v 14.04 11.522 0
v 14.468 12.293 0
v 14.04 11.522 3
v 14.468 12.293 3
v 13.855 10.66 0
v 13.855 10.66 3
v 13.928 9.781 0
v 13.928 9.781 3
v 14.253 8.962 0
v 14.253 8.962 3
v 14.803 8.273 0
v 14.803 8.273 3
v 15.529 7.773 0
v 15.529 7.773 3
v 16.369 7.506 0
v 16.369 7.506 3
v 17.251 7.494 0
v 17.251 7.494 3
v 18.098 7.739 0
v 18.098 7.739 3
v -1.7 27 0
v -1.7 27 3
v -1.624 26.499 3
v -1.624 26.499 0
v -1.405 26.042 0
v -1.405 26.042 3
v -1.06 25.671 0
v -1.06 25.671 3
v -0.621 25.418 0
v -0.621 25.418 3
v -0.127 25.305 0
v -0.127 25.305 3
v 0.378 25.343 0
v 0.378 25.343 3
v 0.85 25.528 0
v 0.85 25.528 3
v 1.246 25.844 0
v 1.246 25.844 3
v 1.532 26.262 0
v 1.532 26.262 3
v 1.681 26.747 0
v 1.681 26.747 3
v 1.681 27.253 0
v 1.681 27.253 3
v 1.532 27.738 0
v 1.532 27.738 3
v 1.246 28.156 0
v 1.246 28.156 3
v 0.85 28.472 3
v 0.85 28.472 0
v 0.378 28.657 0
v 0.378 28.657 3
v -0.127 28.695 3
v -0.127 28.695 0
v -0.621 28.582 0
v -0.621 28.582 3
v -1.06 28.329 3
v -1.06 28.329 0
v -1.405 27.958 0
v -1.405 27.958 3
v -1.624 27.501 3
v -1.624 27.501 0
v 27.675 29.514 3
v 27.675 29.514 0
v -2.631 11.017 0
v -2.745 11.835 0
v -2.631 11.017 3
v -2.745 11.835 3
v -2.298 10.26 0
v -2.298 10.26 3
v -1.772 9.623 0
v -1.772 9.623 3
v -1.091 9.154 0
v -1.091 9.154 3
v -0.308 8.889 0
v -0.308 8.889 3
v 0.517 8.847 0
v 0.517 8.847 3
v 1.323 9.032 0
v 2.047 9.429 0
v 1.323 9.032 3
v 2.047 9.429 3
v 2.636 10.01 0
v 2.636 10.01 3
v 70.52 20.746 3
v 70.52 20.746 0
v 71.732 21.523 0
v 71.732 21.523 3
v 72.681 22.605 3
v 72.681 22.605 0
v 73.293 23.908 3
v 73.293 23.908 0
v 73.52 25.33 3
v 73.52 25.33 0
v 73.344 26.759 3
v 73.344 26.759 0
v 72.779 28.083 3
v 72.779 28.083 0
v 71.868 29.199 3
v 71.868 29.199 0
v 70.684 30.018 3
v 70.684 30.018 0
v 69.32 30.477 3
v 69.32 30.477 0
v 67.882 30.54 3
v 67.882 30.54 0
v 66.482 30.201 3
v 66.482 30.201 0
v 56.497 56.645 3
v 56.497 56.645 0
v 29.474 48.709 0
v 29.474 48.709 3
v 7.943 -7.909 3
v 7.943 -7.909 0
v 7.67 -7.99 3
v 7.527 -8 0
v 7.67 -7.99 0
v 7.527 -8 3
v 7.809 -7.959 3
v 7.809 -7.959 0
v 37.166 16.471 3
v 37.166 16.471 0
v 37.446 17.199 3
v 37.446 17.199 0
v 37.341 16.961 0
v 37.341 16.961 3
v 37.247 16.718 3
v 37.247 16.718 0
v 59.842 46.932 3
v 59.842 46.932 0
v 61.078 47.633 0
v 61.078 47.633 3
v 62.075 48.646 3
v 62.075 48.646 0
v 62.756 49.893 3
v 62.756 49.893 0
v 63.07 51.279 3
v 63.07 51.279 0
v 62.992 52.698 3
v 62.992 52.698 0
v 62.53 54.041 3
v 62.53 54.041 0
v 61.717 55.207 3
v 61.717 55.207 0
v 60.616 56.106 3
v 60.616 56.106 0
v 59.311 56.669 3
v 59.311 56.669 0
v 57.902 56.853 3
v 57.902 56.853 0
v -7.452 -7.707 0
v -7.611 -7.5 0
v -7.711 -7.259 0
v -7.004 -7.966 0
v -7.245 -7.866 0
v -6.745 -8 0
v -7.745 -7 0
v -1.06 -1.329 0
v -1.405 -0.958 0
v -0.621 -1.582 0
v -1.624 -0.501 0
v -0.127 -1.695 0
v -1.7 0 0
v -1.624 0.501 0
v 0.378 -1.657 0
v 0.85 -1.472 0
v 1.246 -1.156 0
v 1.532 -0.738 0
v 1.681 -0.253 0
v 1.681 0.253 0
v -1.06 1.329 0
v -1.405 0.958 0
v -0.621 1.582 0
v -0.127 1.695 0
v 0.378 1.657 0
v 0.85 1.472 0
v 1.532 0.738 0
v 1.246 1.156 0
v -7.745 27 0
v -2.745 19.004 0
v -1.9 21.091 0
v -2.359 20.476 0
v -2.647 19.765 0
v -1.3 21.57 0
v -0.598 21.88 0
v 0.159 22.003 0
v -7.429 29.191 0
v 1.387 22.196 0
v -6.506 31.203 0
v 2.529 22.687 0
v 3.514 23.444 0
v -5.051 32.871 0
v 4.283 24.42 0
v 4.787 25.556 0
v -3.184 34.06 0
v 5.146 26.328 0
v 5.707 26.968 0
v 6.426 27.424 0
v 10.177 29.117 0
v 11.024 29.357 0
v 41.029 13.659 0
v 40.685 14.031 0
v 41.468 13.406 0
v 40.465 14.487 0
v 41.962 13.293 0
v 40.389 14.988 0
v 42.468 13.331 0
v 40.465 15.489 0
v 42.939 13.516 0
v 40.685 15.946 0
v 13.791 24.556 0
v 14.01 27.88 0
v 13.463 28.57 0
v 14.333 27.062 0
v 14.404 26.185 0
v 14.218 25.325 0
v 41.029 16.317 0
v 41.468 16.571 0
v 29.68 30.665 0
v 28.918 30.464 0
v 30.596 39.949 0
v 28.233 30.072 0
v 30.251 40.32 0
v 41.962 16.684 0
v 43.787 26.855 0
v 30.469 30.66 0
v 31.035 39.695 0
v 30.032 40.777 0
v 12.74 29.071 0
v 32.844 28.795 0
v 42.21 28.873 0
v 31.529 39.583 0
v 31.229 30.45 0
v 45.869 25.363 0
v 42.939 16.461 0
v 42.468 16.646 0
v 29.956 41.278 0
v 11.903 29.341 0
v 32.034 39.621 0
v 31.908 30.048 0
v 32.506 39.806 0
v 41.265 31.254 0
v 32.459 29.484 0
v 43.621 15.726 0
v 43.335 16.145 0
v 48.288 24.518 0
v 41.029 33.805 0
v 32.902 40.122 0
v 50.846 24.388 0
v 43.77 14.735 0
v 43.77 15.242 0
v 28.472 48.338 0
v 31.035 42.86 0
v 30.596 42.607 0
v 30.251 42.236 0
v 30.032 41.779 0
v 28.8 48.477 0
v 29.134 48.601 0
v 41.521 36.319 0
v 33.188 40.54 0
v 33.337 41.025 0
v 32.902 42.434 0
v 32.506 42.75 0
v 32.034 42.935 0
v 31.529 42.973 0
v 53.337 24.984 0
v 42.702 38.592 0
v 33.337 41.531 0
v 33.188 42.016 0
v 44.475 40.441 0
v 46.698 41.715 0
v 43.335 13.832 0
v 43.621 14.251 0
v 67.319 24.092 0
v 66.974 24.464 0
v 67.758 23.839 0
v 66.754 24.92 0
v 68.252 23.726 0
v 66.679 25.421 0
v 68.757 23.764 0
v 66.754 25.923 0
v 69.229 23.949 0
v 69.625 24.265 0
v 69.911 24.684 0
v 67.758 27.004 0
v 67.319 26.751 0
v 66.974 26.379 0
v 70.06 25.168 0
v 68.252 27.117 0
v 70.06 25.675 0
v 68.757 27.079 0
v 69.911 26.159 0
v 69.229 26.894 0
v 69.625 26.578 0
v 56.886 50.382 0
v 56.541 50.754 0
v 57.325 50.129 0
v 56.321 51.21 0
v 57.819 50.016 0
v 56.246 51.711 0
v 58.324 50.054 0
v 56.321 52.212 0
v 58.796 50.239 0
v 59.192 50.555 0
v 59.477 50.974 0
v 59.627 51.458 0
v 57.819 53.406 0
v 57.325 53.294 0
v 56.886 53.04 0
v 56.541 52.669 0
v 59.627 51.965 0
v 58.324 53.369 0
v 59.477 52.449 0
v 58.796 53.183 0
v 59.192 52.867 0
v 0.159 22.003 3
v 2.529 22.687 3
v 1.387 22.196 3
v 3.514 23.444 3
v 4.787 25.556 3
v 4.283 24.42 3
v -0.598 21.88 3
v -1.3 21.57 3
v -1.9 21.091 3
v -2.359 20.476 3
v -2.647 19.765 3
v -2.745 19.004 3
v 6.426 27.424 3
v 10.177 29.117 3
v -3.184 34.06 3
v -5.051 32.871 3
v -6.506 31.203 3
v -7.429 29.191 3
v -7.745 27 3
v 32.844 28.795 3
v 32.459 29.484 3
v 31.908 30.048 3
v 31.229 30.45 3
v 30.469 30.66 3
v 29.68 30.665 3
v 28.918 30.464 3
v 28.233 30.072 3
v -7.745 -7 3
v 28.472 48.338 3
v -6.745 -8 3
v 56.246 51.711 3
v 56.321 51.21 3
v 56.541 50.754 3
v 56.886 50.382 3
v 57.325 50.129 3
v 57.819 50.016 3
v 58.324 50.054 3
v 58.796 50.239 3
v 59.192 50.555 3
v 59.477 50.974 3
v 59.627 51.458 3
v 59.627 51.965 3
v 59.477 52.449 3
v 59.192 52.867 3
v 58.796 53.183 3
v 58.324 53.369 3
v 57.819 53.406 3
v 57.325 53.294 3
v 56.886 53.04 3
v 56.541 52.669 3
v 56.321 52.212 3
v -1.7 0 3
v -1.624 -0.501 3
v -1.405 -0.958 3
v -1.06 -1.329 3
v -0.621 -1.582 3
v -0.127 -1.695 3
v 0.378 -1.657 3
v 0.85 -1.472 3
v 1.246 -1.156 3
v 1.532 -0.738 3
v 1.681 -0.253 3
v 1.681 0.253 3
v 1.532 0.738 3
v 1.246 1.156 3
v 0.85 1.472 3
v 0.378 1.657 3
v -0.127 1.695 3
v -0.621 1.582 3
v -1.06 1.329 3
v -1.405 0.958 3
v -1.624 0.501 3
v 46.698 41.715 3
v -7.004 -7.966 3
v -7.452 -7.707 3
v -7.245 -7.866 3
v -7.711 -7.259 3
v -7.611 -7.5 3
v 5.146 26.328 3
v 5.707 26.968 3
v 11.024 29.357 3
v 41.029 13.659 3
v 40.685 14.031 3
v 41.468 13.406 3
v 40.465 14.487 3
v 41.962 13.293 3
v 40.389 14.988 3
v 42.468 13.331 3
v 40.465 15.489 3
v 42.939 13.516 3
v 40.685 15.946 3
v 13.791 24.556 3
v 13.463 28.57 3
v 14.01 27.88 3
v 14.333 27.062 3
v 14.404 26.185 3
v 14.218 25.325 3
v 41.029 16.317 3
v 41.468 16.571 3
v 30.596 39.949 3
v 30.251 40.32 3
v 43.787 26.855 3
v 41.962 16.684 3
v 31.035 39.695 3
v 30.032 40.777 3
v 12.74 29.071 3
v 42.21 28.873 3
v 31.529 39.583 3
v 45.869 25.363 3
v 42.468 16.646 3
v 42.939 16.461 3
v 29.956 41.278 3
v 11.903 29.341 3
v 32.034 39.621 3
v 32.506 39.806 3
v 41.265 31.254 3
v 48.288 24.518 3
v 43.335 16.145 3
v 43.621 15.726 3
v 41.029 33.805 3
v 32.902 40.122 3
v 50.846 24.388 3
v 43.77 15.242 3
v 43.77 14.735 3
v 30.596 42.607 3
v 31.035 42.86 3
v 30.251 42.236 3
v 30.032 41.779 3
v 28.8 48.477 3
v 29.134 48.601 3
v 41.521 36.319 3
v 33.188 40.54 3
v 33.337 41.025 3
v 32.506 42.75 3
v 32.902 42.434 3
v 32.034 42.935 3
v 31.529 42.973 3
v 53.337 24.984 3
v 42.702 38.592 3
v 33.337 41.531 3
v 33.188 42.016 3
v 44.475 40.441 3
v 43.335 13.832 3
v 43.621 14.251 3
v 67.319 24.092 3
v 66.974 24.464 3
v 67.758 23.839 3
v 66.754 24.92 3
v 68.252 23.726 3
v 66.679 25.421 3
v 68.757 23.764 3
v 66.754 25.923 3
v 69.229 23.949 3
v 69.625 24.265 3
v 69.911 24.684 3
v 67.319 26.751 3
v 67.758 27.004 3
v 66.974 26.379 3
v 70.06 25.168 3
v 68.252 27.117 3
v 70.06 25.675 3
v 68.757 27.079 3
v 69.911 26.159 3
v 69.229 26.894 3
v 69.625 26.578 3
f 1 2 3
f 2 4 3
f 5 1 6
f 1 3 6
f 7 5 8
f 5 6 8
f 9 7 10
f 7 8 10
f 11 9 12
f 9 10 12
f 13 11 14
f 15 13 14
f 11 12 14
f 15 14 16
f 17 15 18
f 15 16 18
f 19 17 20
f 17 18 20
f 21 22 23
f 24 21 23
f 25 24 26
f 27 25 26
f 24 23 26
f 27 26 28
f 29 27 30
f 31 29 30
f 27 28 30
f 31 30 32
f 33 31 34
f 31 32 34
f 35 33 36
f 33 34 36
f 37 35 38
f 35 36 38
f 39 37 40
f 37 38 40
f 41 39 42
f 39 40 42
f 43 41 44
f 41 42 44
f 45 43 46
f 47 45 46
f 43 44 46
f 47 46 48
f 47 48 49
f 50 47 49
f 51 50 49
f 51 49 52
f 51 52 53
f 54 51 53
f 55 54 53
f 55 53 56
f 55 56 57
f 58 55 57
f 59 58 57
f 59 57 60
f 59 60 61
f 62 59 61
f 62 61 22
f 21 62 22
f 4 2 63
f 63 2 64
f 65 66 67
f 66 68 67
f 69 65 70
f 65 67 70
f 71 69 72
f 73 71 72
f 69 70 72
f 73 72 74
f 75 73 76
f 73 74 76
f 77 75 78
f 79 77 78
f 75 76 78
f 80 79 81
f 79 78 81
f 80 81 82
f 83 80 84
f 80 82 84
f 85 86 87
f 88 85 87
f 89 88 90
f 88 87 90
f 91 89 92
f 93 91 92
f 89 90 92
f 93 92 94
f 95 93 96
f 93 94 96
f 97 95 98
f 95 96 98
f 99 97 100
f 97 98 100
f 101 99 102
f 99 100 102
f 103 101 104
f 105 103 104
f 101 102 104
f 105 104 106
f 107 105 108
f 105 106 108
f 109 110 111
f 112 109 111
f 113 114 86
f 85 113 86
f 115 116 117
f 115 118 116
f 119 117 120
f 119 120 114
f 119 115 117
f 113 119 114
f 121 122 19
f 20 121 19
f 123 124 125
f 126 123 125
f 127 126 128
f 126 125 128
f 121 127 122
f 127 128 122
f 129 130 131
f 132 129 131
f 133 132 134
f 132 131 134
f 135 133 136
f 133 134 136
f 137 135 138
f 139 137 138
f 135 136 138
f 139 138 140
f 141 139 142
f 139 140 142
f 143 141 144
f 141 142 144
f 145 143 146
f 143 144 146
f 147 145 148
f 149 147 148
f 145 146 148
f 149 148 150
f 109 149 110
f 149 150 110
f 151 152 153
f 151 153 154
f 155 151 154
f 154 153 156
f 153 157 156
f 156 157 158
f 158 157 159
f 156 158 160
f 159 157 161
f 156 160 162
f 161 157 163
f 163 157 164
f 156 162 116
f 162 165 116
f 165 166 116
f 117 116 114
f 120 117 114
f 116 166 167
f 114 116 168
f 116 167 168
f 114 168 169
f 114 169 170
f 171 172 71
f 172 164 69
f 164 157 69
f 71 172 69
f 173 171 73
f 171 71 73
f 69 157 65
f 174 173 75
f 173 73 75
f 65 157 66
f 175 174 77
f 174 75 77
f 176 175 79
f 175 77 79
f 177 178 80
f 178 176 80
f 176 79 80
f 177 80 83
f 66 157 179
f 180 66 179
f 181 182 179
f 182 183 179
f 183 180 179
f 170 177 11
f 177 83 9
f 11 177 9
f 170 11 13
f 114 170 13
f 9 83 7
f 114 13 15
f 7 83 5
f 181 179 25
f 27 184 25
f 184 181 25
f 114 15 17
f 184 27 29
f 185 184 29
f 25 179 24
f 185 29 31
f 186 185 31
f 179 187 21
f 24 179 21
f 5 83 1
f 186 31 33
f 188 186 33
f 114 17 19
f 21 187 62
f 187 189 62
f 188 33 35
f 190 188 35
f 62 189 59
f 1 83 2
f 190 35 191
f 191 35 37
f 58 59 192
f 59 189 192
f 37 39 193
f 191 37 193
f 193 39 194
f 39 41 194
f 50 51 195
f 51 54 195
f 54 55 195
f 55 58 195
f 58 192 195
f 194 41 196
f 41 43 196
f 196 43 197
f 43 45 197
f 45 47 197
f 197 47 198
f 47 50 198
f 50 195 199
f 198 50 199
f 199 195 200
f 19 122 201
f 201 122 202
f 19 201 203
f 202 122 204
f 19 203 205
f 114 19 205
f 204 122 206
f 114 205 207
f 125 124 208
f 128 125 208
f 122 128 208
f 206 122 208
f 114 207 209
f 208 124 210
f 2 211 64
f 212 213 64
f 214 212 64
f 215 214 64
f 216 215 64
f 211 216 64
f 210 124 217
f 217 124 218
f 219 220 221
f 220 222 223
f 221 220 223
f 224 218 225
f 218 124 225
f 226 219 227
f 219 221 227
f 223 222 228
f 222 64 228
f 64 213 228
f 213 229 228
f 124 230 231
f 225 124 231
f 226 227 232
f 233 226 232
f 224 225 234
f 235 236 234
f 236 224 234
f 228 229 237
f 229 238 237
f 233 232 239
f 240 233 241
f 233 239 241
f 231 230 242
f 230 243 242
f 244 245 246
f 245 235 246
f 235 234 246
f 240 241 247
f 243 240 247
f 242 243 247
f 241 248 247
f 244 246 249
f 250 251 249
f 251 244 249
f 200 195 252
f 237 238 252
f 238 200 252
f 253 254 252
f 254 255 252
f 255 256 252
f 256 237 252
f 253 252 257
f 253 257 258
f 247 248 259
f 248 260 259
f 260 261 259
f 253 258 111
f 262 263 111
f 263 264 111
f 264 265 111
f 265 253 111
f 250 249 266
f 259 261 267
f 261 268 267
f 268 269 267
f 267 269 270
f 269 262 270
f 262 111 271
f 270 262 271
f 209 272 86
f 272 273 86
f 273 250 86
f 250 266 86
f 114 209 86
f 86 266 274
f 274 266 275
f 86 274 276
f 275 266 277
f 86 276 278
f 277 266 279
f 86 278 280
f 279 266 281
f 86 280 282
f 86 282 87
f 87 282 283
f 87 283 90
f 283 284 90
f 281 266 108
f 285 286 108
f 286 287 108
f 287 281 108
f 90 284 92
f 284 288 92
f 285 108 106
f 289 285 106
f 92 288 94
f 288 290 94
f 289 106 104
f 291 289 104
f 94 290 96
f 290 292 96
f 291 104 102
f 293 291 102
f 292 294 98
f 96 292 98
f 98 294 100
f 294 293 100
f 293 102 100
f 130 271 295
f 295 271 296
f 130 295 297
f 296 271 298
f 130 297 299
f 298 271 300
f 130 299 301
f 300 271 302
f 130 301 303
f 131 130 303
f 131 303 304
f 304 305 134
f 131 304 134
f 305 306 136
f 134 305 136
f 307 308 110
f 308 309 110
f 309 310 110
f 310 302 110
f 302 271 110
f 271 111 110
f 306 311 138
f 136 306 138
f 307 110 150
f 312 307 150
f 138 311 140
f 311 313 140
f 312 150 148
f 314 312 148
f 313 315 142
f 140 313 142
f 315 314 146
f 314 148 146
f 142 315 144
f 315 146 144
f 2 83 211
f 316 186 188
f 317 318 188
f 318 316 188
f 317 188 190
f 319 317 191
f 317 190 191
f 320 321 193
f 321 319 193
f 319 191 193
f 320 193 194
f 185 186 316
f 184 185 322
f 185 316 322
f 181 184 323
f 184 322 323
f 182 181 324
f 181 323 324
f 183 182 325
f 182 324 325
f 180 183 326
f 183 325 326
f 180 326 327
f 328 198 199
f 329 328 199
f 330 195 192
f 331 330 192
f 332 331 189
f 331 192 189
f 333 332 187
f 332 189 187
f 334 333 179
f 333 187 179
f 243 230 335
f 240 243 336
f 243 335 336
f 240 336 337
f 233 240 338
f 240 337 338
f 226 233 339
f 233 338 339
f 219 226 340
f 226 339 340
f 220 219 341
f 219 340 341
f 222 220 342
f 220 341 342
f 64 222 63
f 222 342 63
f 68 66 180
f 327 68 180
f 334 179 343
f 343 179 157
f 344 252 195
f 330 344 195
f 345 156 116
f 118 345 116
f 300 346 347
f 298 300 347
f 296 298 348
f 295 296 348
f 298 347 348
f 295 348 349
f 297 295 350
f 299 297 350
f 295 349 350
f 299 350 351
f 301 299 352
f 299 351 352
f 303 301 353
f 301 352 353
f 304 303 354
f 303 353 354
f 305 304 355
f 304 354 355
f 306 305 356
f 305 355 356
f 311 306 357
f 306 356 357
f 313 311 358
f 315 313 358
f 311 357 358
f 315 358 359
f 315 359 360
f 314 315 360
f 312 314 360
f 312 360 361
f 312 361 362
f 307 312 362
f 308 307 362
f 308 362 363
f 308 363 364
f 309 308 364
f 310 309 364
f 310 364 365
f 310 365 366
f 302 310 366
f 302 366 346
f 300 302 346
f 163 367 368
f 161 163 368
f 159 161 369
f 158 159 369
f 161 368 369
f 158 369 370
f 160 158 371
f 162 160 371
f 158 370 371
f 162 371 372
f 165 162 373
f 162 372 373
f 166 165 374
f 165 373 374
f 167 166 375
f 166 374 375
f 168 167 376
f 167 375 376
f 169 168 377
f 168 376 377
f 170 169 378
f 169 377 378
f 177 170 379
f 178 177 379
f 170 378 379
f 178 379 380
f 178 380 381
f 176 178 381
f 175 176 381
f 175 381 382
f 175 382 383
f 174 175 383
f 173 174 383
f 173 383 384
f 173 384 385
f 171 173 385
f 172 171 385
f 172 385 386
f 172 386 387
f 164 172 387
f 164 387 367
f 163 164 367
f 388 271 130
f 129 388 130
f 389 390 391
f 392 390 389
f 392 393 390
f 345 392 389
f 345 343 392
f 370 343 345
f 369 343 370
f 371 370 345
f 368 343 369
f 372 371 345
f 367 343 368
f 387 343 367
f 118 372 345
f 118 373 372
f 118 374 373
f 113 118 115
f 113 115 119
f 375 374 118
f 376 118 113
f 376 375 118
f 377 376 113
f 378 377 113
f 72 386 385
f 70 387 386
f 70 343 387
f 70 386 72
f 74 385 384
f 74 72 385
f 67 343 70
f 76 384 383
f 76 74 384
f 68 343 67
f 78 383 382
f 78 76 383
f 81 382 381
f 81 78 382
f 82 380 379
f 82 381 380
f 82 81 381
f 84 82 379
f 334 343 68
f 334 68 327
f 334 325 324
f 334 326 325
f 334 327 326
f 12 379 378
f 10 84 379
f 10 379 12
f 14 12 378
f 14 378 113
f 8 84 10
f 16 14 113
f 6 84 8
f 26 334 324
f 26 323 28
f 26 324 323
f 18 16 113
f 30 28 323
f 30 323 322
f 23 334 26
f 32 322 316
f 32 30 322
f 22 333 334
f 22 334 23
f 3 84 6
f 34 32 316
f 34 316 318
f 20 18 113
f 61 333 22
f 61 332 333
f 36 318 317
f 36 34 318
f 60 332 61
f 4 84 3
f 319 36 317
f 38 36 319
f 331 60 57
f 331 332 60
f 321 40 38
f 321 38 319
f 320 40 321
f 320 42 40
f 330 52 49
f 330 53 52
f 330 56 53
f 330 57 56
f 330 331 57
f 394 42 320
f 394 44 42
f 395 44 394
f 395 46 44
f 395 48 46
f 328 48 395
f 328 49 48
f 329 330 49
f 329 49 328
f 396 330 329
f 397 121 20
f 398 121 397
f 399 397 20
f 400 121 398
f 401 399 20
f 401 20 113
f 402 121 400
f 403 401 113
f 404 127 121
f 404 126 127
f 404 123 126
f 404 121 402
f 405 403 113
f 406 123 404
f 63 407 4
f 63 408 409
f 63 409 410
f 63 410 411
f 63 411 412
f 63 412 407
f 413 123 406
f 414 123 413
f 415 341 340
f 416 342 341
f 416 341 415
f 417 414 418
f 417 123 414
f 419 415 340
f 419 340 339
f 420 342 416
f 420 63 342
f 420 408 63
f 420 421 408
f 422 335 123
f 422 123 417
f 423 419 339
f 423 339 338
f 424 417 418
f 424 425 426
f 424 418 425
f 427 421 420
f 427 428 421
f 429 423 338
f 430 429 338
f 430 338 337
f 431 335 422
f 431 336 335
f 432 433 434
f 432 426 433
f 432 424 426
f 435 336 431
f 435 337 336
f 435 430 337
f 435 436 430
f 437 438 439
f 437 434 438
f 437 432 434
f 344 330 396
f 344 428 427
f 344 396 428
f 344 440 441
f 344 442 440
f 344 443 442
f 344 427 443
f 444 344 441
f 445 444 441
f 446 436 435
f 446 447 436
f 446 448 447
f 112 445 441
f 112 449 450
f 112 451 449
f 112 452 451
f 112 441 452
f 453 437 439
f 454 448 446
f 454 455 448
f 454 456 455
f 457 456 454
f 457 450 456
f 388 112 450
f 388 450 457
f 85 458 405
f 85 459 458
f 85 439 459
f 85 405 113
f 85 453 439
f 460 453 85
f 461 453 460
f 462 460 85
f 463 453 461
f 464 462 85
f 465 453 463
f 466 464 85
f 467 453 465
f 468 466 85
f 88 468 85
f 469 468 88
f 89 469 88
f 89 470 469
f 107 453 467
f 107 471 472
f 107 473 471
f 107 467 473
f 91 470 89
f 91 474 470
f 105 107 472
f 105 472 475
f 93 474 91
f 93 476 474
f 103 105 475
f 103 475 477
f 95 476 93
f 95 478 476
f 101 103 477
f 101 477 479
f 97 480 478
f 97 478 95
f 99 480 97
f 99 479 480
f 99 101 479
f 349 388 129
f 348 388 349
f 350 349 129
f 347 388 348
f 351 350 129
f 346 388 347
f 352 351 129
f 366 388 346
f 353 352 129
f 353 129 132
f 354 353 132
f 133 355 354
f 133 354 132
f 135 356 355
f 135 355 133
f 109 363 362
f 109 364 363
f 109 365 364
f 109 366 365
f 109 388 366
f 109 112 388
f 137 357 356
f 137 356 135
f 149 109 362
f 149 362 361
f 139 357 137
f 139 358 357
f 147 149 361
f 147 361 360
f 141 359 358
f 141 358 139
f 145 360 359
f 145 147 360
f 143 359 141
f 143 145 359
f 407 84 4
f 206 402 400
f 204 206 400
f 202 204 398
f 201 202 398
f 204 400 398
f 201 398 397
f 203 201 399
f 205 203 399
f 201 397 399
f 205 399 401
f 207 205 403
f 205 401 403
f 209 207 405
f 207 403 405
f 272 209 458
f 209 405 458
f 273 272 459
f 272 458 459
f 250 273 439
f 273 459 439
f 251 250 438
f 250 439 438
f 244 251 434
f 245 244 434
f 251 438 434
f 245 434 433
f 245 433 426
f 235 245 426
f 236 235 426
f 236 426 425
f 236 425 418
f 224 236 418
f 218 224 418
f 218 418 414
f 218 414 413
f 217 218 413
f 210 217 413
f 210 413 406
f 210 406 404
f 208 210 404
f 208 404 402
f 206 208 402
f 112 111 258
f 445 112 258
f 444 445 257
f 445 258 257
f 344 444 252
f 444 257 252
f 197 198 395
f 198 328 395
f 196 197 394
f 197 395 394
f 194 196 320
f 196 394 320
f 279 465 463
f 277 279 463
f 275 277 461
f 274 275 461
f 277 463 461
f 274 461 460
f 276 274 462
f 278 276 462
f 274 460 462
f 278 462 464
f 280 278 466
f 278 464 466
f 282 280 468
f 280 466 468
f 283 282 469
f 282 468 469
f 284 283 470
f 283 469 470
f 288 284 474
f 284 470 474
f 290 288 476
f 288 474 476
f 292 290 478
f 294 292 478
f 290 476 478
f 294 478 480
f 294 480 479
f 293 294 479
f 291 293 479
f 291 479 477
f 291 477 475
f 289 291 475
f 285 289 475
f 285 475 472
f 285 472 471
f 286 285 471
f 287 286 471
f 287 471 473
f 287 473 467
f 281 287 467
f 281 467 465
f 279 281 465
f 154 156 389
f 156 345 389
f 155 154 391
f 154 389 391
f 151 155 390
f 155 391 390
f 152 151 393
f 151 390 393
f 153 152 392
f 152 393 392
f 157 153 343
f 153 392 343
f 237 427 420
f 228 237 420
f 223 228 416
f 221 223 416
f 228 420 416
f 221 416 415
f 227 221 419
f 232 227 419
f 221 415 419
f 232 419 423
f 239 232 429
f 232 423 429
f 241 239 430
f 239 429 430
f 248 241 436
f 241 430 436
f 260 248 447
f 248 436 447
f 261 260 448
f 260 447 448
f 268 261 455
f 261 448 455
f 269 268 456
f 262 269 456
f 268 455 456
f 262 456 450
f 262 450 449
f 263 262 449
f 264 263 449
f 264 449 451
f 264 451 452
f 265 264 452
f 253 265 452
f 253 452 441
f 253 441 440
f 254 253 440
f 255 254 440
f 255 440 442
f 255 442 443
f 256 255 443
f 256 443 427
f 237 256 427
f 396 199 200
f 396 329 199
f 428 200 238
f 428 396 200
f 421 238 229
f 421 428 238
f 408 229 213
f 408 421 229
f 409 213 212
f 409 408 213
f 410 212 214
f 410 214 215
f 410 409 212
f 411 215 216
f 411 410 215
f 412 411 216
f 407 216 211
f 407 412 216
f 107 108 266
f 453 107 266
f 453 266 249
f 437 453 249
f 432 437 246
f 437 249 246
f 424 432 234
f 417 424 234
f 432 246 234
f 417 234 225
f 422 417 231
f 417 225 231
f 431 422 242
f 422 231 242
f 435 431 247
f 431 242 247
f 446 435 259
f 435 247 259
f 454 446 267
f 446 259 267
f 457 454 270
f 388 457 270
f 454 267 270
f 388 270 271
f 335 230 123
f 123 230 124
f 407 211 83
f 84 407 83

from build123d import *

# Parameters (mm, degrees)
BOSS_EXTRUDE1_DEPTH  = 3
M3_CLEARANCE_HOLE1_D = 3.4
FILLET1_R            = 1
CUT_EXTRUDE1_DEPTH   = 93.987352344
FILLET2_R            = 3


with BuildPart() as part:
    # Sketch1 → Boss-Extrude1 (new body)
    with BuildSketch(Plane.XY):
        with BuildLine():
            Line((-7.745, -8), (7.745, -8))
            Line((7.745, -8), (70.519857407, 20.746231418))
            ThreePointArc((70.519857407, 20.746231418), (73.107899278, 27.441010115), (66.482157687, 30.201004841))
            Line((66.482157687, 30.201004841), (53.337310845, 24.984396605))
            ThreePointArc((53.337310845, 24.984396605), (41.652152386, 30.029896758), (46.697652539, 41.715055217))
            Line((46.697652539, 41.715055217), (59.842499382, 46.931663453))
            ThreePointArc((59.842499382, 46.931663453), (62.807533315, 53.385795263), (56.49682568, 56.644968901))
            Line((56.49682568, 56.644968901), (29.473725399, 48.709154624))
            ThreePointArc((29.473725399, 48.709154624), (28.966294631, 48.540909296), (28.471678813, 48.338060414))
            Line((28.471678813, 48.338060414), (-3.1843478, 34.060095898))
            ThreePointArc((-3.1843478, 34.060095898), (-6.505682082, 31.202514205), (-7.745, 27))
            Line((-7.745, 27), (-7.745, -8))
        make_face()
    extrude(amount=BOSS_EXTRUDE1_DEPTH)

    # M3 Clearance Hole1 (through all)
    with Locations(Plane(origin=(0, 0, 0), x_dir=(1, 0, 0), z_dir=(0, 0, -1))):
        with Locations((57.945720298, -51.711180989), (68.378936771, -25.421487305), (42.089243086, -14.988270832), (31.656026613, -41.277964517), (0, -27), (0, 0)):
            Hole(M3_CLEARANCE_HOLE1_D / 2)

    # Fillet1
    fillet1_edges = [part.edges().sort_by_distance(p)[0] for p in [
        (7.745, -8, 1.5),
        (-7.745, -8, 1.5),
    ]]
    fillet(fillet1_edges, radius=FILLET1_R)

    # Sketch4 → Cut-Extrude1 (cut, through all)
    with BuildSketch(Plane(origin=(0, 0, 0), x_dir=(-1, 0, 0), z_dir=(0, 0, -1))):
        with BuildLine():
            ThreePointArc((-37.446464364, 17.198737867), (-37.2921785, 16.840223889), (-37.165529718, 16.471040349))
            Line((-37.165529718, 16.471040349), (-7.121534424, 2.713117557))
            Line((-7.121534424, 2.713117557), (-30.893579986, 33.710742913))
            Line((-30.893579986, 33.710742913), (-37.446464364, 17.198737867))
        make_face()
        with BuildLine():
            Line((-21.049163615, 34.020143008), (2.745, 2.993676756))
            Line((2.745, 2.993676756), (2.745, 22.820888252))
            ThreePointArc((2.745, 22.820888252), (-2.276587416, 22.548354266), (-4.995123002, 26.779214606))
            Line((-4.995123002, 26.779214606), (-21.049163615, 34.020143008))
        make_face()
    extrude(amount=-CUT_EXTRUDE1_DEPTH, mode=Mode.SUBTRACT)

    # Fillet2
    fillet2_edges = [part.edges().sort_by_distance(p)[0] for p in [
        (30.893579986, 33.710742913, 1.5),
        (7.121534424, 2.713117557, 1.5),
        (-2.745, 22.820888252, 1.5),
        (-2.745, 2.993676756, 1.5),
        (21.049163615, 34.020143008, 1.5),
        (4.995123002, 26.779214606, 1.5),
    ]]
    fillet(fillet2_edges, radius=FILLET2_R)


solid = part.part
